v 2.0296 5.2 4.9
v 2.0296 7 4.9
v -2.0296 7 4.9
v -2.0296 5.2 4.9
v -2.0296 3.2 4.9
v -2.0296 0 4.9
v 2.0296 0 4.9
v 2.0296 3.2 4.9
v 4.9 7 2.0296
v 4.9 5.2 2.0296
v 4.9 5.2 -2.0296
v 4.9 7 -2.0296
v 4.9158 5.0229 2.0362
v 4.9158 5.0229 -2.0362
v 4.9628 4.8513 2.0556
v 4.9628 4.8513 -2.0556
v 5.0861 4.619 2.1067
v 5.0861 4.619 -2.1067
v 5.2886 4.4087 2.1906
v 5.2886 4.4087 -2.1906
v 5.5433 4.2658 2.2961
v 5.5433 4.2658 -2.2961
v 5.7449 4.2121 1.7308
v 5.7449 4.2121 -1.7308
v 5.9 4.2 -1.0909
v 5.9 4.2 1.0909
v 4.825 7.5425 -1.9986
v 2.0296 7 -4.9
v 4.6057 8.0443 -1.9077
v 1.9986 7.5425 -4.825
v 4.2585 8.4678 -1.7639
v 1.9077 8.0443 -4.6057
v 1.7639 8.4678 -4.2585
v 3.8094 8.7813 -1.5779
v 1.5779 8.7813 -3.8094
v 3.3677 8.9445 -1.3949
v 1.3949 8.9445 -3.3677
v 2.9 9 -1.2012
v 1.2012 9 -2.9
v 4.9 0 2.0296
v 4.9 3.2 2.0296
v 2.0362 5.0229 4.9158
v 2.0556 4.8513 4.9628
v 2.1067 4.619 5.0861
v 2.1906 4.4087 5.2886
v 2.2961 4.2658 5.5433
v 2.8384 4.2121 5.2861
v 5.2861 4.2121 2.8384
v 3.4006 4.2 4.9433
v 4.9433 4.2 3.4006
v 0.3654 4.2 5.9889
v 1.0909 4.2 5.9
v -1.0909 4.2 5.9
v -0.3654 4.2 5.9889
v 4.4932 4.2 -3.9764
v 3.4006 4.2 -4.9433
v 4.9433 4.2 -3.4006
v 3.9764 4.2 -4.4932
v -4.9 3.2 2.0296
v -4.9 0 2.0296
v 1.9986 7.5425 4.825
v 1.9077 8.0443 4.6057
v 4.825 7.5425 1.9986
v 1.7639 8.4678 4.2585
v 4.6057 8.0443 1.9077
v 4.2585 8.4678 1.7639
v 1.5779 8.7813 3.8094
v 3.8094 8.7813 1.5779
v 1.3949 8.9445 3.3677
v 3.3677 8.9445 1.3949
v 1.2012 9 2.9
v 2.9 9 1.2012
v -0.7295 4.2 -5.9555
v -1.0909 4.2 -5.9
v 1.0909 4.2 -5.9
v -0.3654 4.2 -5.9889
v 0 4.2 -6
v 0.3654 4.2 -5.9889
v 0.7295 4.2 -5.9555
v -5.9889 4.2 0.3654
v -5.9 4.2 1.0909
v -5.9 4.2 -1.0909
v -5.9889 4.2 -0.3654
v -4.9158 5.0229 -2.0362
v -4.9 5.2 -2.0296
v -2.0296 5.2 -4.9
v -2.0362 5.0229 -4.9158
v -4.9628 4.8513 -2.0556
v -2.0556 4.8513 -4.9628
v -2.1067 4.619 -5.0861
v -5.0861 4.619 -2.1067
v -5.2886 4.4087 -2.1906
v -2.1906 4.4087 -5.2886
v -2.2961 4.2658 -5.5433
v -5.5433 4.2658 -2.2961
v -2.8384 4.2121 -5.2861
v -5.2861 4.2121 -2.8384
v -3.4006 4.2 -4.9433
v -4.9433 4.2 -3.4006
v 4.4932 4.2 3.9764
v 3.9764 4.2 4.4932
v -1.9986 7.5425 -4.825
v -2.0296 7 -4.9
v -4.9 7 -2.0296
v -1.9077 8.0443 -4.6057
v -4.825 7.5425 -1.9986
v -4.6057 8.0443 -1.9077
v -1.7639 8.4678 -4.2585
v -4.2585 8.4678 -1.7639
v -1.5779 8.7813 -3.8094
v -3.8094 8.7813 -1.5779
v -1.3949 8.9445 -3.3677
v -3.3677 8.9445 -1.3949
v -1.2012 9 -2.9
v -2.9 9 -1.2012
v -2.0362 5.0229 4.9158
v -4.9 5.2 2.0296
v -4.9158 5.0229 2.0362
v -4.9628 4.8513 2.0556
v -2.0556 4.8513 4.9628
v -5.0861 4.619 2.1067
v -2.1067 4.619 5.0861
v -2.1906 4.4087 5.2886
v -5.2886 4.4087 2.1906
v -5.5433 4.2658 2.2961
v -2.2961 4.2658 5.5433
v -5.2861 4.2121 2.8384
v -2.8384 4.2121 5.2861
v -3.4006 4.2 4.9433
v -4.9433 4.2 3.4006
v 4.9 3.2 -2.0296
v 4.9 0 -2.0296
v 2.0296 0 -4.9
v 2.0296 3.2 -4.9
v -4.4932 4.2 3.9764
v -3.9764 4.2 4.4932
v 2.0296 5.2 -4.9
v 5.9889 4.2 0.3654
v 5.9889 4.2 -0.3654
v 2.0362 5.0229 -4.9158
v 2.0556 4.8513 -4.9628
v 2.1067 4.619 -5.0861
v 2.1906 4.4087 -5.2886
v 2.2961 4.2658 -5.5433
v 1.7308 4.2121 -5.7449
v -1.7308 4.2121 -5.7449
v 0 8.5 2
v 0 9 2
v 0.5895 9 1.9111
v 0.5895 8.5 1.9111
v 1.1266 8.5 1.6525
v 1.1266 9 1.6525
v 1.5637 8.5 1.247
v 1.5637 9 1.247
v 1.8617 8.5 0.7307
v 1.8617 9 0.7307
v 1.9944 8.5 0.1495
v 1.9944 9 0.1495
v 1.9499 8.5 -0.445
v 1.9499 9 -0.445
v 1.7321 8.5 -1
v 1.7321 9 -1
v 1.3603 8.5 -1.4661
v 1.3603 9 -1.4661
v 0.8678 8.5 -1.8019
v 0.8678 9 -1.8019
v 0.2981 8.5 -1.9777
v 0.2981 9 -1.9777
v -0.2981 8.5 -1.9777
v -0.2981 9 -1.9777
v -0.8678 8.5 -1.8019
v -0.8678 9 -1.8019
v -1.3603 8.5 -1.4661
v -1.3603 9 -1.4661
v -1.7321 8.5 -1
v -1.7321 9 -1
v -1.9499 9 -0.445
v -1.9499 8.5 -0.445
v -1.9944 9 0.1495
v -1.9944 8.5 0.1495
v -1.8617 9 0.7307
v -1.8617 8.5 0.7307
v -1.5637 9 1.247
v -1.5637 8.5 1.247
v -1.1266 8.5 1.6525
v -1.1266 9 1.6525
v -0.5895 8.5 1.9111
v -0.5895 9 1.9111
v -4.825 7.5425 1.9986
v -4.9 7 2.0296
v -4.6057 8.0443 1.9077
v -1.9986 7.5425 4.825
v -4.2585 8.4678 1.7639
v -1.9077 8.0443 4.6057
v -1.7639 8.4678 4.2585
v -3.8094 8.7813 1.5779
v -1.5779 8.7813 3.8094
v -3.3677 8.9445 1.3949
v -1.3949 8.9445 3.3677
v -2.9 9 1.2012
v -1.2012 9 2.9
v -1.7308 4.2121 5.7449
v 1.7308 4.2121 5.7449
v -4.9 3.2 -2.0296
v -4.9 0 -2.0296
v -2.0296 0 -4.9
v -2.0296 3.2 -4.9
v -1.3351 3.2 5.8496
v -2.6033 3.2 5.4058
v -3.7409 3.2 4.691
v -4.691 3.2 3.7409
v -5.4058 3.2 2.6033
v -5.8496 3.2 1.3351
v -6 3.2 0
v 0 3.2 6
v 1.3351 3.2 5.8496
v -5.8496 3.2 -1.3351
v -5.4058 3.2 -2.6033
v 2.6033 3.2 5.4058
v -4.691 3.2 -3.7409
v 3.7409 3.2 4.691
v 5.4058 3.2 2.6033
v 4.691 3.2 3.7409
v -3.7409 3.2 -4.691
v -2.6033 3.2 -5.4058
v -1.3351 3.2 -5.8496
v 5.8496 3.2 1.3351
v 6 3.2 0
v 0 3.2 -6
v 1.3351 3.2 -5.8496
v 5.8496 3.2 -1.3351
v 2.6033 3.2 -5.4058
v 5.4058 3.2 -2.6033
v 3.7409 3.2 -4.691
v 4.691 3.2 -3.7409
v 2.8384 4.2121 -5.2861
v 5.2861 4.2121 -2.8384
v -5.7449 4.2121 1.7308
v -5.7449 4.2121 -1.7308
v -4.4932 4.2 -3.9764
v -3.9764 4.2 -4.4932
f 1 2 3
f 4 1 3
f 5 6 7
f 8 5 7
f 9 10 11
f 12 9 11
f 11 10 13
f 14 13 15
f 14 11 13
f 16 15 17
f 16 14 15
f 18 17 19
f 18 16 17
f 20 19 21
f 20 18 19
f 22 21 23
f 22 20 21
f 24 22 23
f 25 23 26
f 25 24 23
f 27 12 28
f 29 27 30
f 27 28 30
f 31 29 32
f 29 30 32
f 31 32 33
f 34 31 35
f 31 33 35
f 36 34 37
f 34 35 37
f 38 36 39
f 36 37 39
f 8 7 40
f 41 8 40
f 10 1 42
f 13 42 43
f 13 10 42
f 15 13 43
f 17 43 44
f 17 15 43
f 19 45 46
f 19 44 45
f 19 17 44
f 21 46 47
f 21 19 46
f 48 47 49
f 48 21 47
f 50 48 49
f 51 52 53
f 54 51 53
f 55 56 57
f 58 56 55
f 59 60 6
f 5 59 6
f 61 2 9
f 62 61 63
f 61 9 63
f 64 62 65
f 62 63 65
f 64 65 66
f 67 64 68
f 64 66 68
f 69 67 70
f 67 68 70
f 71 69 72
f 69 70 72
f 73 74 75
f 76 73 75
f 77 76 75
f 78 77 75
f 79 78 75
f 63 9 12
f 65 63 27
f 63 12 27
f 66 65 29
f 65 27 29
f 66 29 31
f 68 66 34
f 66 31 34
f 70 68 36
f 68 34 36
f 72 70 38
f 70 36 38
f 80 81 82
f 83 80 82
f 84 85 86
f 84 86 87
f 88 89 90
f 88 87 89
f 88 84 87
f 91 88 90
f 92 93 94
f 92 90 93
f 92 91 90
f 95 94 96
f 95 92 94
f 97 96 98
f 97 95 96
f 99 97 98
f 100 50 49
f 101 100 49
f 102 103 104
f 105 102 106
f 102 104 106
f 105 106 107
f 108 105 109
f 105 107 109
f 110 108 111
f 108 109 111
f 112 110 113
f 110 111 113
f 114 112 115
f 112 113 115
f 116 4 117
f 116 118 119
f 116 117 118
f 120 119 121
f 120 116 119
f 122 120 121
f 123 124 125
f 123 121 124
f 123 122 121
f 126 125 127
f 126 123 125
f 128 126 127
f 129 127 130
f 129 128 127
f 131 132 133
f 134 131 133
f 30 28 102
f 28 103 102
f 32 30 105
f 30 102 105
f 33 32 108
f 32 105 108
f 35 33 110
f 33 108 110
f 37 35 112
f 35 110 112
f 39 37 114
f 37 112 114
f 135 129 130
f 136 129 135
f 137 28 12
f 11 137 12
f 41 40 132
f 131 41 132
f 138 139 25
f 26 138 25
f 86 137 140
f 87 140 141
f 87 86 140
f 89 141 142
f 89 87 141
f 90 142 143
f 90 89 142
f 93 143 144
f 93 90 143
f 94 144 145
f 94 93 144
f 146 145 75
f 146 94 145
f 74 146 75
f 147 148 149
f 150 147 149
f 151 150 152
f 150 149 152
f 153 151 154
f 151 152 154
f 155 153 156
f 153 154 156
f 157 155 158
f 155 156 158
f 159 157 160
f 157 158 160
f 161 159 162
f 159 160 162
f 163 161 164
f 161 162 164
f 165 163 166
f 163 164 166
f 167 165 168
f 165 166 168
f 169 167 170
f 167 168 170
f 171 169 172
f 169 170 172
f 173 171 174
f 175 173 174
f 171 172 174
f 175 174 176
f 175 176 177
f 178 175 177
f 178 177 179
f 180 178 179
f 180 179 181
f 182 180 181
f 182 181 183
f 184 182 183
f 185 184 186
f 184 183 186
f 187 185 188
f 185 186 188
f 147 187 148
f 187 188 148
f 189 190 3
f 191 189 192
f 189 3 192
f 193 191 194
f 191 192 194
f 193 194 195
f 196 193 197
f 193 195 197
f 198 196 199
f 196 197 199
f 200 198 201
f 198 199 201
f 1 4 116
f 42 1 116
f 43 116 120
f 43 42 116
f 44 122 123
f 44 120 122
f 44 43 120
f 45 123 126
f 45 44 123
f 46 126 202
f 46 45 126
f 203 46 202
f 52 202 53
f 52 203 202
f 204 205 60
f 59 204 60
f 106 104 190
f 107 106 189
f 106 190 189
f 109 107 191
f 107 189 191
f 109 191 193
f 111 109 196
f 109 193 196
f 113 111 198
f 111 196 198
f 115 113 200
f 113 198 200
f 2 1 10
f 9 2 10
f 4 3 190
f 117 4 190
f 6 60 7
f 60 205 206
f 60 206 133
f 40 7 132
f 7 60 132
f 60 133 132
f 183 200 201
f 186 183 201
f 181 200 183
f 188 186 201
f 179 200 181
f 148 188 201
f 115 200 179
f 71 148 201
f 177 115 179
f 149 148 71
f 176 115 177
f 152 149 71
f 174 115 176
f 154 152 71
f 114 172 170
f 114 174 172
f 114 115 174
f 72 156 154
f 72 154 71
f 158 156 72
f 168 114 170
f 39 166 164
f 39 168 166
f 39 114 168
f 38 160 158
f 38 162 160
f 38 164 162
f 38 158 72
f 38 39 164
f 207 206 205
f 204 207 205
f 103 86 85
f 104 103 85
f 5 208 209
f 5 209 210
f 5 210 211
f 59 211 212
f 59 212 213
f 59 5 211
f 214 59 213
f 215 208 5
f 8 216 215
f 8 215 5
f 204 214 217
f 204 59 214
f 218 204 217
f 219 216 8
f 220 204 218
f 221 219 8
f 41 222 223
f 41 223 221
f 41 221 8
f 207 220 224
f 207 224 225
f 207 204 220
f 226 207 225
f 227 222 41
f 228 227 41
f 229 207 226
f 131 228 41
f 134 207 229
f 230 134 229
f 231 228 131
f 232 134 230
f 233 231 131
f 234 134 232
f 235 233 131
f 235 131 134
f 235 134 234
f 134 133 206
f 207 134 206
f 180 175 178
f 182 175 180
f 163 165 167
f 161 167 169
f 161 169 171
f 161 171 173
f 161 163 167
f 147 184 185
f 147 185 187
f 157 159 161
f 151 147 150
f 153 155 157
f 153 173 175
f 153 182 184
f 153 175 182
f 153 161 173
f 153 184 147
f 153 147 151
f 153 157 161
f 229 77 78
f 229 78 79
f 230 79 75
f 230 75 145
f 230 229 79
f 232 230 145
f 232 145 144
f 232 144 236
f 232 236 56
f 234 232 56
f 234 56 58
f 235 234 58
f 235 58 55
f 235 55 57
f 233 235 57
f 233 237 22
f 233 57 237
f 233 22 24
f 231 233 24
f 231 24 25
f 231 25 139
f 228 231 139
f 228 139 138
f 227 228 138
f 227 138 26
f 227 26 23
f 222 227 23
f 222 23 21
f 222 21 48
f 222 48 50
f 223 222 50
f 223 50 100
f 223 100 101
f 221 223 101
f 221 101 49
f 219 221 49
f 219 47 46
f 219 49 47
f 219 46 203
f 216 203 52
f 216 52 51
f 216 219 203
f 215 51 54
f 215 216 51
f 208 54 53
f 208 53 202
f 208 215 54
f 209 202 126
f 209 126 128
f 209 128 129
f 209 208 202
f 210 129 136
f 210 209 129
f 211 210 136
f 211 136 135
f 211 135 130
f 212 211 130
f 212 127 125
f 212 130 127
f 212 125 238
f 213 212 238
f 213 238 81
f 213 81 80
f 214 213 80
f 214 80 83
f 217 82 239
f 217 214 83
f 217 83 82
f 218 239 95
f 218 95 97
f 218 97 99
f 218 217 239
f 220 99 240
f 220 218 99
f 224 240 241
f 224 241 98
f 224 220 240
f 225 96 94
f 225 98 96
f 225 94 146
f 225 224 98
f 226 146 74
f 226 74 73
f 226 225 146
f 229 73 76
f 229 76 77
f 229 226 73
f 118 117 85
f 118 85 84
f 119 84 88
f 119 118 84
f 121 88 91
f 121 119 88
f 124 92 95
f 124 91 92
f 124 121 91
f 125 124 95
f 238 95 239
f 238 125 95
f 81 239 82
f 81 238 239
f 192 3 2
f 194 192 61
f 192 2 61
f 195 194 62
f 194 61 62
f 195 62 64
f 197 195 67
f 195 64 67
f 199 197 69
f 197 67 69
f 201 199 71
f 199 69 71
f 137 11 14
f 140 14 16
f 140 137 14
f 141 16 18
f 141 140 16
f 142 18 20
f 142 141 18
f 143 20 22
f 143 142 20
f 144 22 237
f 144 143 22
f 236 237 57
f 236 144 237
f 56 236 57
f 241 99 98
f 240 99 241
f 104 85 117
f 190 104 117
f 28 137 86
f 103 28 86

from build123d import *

# Parameters (mm, degrees)
BOSS_EXTRUDE1_DEPTH = 9
SKETCH2_R           = 2
CUT_EXTRUDE1_DEPTH  = 0.5
BOSS_EXTRUDE2_START = -3.2
SKETCH3_R           = 6
BOSS_EXTRUDE2_DEPTH = 1
FILLET1_R           = 2
FILLET2_R           = 1


with BuildPart() as part:
    # Sketch1 → Boss-Extrude1 (new body)
    with BuildSketch(Plane(origin=(0, 0, 0), x_dir=(1, 0, 0), z_dir=(0, 1, 0))):
        Polygon((2.029646456, 4.9), (-2.029646456, 4.9), (-4.9, 2.029646456), (-4.9, -2.029646456), (-2.029646456, -4.9), (2.029646456, -4.9), (4.9, -2.029646456), (4.9, 2.029646456), align=None)
    extrude(amount=BOSS_EXTRUDE1_DEPTH)

    # Sketch2 → Cut-Extrude1 (cut)
    with BuildSketch(Plane(origin=(0, 9, 0), x_dir=(1, 0, 0), z_dir=(0, 1, 0))):
        with Locations(Location((0, 0, 0), (0, 0, 270))):
            Circle(SKETCH2_R)
    extrude(amount=-CUT_EXTRUDE1_DEPTH, mode=Mode.SUBTRACT)

    # Sketch3 → Boss-Extrude2 (add)
    with BuildSketch(Plane.XZ.offset(BOSS_EXTRUDE2_START)):
        with Locations(Location((0, 0, 0), (0, 0, 270))):
            Circle(SKETCH3_R)
    extrude(amount=-BOSS_EXTRUDE2_DEPTH)

    # Fillet1
    fillet1_edges = [part.edges().sort_by_distance(p)[0] for p in [
        (-3.464823228, 9, -3.464823228),
        (-4.9, 9, 0),
        (-3.464823228, 9, 3.464823228),
        (0, 9, 4.9),
        (3.464823228, 9, 3.464823228),
        (4.9, 9, 0),
        (3.464823228, 9, -3.464823228),
        (0, 9, -4.9),
    ]]
    fillet(fillet1_edges, radius=FILLET1_R)

    # Fillet2
    # the kernel refuses this fillet: 1 mm, written as the material it adds along each edge
    with BuildSketch(Plane(origin=(4.9, 4.2, -4.529646456), x_dir=(1, 0, 0), z_dir=(0, 0, 1))) as fillet2_piece_1_section:
        with BuildLine():
            CenterArc((FILLET2_R, FILLET2_R), FILLET2_R, 180, 90)
            Line((0, FILLET2_R), (0, 0))
            Line((0, 0), (FILLET2_R, 0))
        make_face()
    fillet2_piece_1 = extrude(amount=9.059292911, mode=Mode.PRIVATE)
    fillet2_piece_1 = split(fillet2_piece_1, bisect_by=Plane(origin=(6.015133886, 4.441621339, -0.91451257), z_dir=(-0.7071067811865472, 0, 0.7071067811865478)), keep=Keep.TOP, mode=Mode.PRIVATE)
    fillet2_piece_1 = split(fillet2_piece_1, bisect_by=Plane(origin=(6.015133886, 4.441621339, 0.91451257), z_dir=(-0.7071067811865478, 0, -0.7071067811865474)), keep=Keep.TOP, mode=Mode.PRIVATE)
    add(fillet2_piece_1)
    with BuildSketch(Plane(origin=(-4.529646456, 4.2, -4.9), x_dir=(0, 1, 0), z_dir=(1, 0, 0))) as fillet2_piece_2_section:
        with BuildLine():
            CenterArc((FILLET2_R, -FILLET2_R), FILLET2_R, 90, 90)
            Line((0, -FILLET2_R), (0, 0))
            Line((0, 0), (FILLET2_R, 0))
        make_face()
    fillet2_piece_2 = extrude(amount=9.059292911, mode=Mode.PRIVATE)
    fillet2_piece_2 = split(fillet2_piece_2, bisect_by=Plane(origin=(-0.91451257, 4.441621339, -6.015133886), z_dir=(0.7071067811865479, 0, 0.7071067811865472)), keep=Keep.TOP, mode=Mode.PRIVATE)
    fillet2_piece_2 = split(fillet2_piece_2, bisect_by=Plane(origin=(0.91451257, 4.441621339, -6.015133886), z_dir=(-0.7071067811865472, 0, 0.7071067811865478)), keep=Keep.TOP, mode=Mode.PRIVATE)
    add(fillet2_piece_2)
    with BuildSketch(Plane(origin=(0.261879503, 4.2, -6.667766953), x_dir=(0.7071067811865472, 0, -0.7071067811865479), z_dir=(0.7071067811865479, 0, 0.7071067811865474))) as fillet2_piece_3_section:
        with BuildLine():
            CenterArc((FILLET2_R, FILLET2_R), FILLET2_R, 180, 90)
            Line((0, FILLET2_R), (0, 0))
            Line((0, 0), (FILLET2_R, 0))
        make_face()
    fillet2_piece_3 = extrude(amount=9.059292911, mode=Mode.PRIVATE)
    fillet2_piece_3 = split(fillet2_piece_3, bisect_by=Plane(origin=(3.606683921, 4.441621339, -4.9), z_dir=(0, 0, 1)), keep=Keep.TOP, mode=Mode.PRIVATE)
    fillet2_piece_3 = split(fillet2_piece_3, bisect_by=Plane(origin=(4.9, 4.441621339, -3.606683921), z_dir=(-1, 0, 0)), keep=Keep.TOP, mode=Mode.PRIVATE)
    add(fillet2_piece_3)
    with BuildSketch(Plane(origin=(6.667766953, 4.2, 0.261879503), x_dir=(0.7071067811865478, 0, 0.7071067811865474), z_dir=(-0.7071067811865474, 0, 0.7071067811865478))) as fillet2_piece_4_section:
        with BuildLine():
            CenterArc((FILLET2_R, FILLET2_R), FILLET2_R, 180, 90)
            Line((0, FILLET2_R), (0, 0))
            Line((0, 0), (FILLET2_R, 0))
        make_face()
    fillet2_piece_4 = extrude(amount=9.059292911, mode=Mode.PRIVATE)
    fillet2_piece_4 = split(fillet2_piece_4, bisect_by=Plane(origin=(4.9, 4.441621339, 3.606683921), z_dir=(-1, 0, 0)), keep=Keep.TOP, mode=Mode.PRIVATE)
    fillet2_piece_4 = split(fillet2_piece_4, bisect_by=Plane(origin=(3.606683921, 4.441621339, 4.9), z_dir=(0, 0, -1)), keep=Keep.TOP, mode=Mode.PRIVATE)
    add(fillet2_piece_4)
    with BuildSketch(Plane(origin=(4.529646456, 4.2, 4.9), x_dir=(0, 0, 1), z_dir=(-1, 0, 0))) as fillet2_piece_5_section:
        with BuildLine():
            CenterArc((FILLET2_R, FILLET2_R), FILLET2_R, 180, 90)
            Line((0, FILLET2_R), (0, 0))
            Line((0, 0), (FILLET2_R, 0))
        make_face()
    fillet2_piece_5 = extrude(amount=9.059292911, mode=Mode.PRIVATE)
    fillet2_piece_5 = split(fillet2_piece_5, bisect_by=Plane(origin=(0.91451257, 4.441621339, 6.015133886), z_dir=(-0.7071067811865478, 0, -0.7071067811865474)), keep=Keep.TOP, mode=Mode.PRIVATE)
    fillet2_piece_5 = split(fillet2_piece_5, bisect_by=Plane(origin=(-0.91451257, 4.441621339, 6.015133886), z_dir=(0.7071067811865471, 0, -0.707106781186548)), keep=Keep.TOP, mode=Mode.PRIVATE)
    add(fillet2_piece_5)
    with BuildSketch(Plane(origin=(-0.261879503, 4.2, 6.667766953), x_dir=(-0.7071067811865471, 0, 0.707106781186548), z_dir=(-0.707106781186548, 0, -0.7071067811865471))) as fillet2_piece_6_section:
        with BuildLine():
            CenterArc((FILLET2_R, FILLET2_R), FILLET2_R, 180, 90)
            Line((0, FILLET2_R), (0, 0))
            Line((0, 0), (FILLET2_R, 0))
        make_face()
    fillet2_piece_6 = extrude(amount=9.059292911, mode=Mode.PRIVATE)
    fillet2_piece_6 = split(fillet2_piece_6, bisect_by=Plane(origin=(-4.9, 4.441621339, 3.606683921), z_dir=(1, 0, 0)), keep=Keep.TOP, mode=Mode.PRIVATE)
    fillet2_piece_6 = split(fillet2_piece_6, bisect_by=Plane(origin=(-3.606683921, 4.441621339, 4.9), z_dir=(0, 0, -1)), keep=Keep.TOP, mode=Mode.PRIVATE)
    add(fillet2_piece_6)
    with BuildSketch(Plane(origin=(-4.9, 4.2, 4.529646456), x_dir=(-1, 0, 0), z_dir=(0, 0, -1))) as fillet2_piece_7_section:
        with BuildLine():
            CenterArc((FILLET2_R, FILLET2_R), FILLET2_R, 180, 90)
            Line((0, FILLET2_R), (0, 0))
            Line((0, 0), (FILLET2_R, 0))
        make_face()
    fillet2_piece_7 = extrude(amount=9.059292911, mode=Mode.PRIVATE)
    fillet2_piece_7 = split(fillet2_piece_7, bisect_by=Plane(origin=(-6.015133886, 4.441621339, -0.91451257), z_dir=(0.7071067811865479, 0, 0.7071067811865472)), keep=Keep.TOP, mode=Mode.PRIVATE)
    fillet2_piece_7 = split(fillet2_piece_7, bisect_by=Plane(origin=(-6.015133886, 4.441621339, 0.91451257), z_dir=(0.7071067811865471, 0, -0.707106781186548)), keep=Keep.TOP, mode=Mode.PRIVATE)
    add(fillet2_piece_7)
    with BuildSketch(Plane(origin=(-6.667766953, 4.2, -0.261879503), x_dir=(0, 1, 0), z_dir=(0.7071067811865472, 0, -0.7071067811865479))) as fillet2_piece_8_section:
        with BuildLine():
            CenterArc((FILLET2_R, -FILLET2_R), FILLET2_R, 90, 90)
            Line((0, -FILLET2_R), (0, 0))
            Line((0, 0), (FILLET2_R, 0))
        make_face()
    fillet2_piece_8 = extrude(amount=9.059292911, mode=Mode.PRIVATE)
    fillet2_piece_8 = split(fillet2_piece_8, bisect_by=Plane(origin=(-3.606683921, 4.441621339, -4.9), z_dir=(0, 0, 1)), keep=Keep.TOP, mode=Mode.PRIVATE)
    fillet2_piece_8 = split(fillet2_piece_8, bisect_by=Plane(origin=(-4.9, 4.441621339, -3.606683921), z_dir=(1, 0, 0)), keep=Keep.TOP, mode=Mode.PRIVATE)
    add(fillet2_piece_8)
    with BuildSketch(Plane(origin=(0.261879503, 4.2, -6.667766953), x_dir=(0.7071067811865472, 0, -0.7071067811865479), z_dir=(0.7071067811865479, 0, 0.7071067811865474))) as fillet2_piece_9a_section:
        with BuildLine():
            CenterArc((FILLET2_R, FILLET2_R), FILLET2_R, 180, 90)
            Line((0, FILLET2_R), (0, 0))
            Line((0, 0), (FILLET2_R, 0))
        make_face()
    fillet2_piece_9a = extrude(amount=9.059292911, mode=Mode.PRIVATE)
    fillet2_piece_9a = fillet2_piece_9a & Plane(origin=(0, 4.443429881, 0), x_dir=(0, 0, -1), z_dir=(0, -1, 0)) * Cylinder(6, 23, mode=Mode.PRIVATE)
    fillet2_piece_9a = split(fillet2_piece_9a, bisect_by=Plane(origin=(4.9, 4.443429881, -1.840690438), z_dir=(1, 0, 0)), keep=Keep.TOP, mode=Mode.PRIVATE)
    with BuildSketch(Plane(origin=(4.9, 4.2, -4.529646456), x_dir=(1, 0, 0), z_dir=(0, 0, 1))) as fillet2_piece_9b_section:
        with BuildLine():
            CenterArc((FILLET2_R, FILLET2_R), FILLET2_R, 180, 90)
            Line((0, FILLET2_R), (0, 0))
            Line((0, 0), (FILLET2_R, 0))
        make_face()
    fillet2_piece_9b = extrude(amount=9.059292911, mode=Mode.PRIVATE)
    fillet2_piece_9b = fillet2_piece_9b & Plane(origin=(0, 4.443429353, 0), x_dir=(0, 0, -1), z_dir=(0, -1, 0)) * Cylinder(6, 23, mode=Mode.PRIVATE)
    fillet2_piece_9b = split(fillet2_piece_9b, bisect_by=Plane(origin=(4.766386863, 4.443429353, -2.163259593), z_dir=(0.7071067811865472, 0, -0.7071067811865478)), keep=Keep.TOP, mode=Mode.PRIVATE)
    fillet2_piece_9 = fillet2_piece_9a & fillet2_piece_9b
    add(fillet2_piece_9)
    with BuildSketch(Plane(origin=(4.9, 4.2, -4.529646456), x_dir=(1, 0, 0), z_dir=(0, 0, 1))) as fillet2_piece_10a_section:
        with BuildLine():
            CenterArc((FILLET2_R, FILLET2_R), FILLET2_R, 180, 90)
            Line((0, FILLET2_R), (0, 0))
            Line((0, 0), (FILLET2_R, 0))
        make_face()
    fillet2_piece_10a = extrude(amount=9.059292911, mode=Mode.PRIVATE)
    fillet2_piece_10a = fillet2_piece_10a & Plane(origin=(0, 4.443429527, 0), x_dir=(0, 0, -1), z_dir=(0, -1, 0)) * Cylinder(6, 23, mode=Mode.PRIVATE)
    fillet2_piece_10a = split(fillet2_piece_10a, bisect_by=Plane(origin=(4.766387172, 4.443429527, 2.163259283), z_dir=(0.7071067811865478, 0, 0.7071067811865474)), keep=Keep.TOP, mode=Mode.PRIVATE)
    with BuildSketch(Plane(origin=(6.667766953, 4.2, 0.261879503), x_dir=(0.7071067811865478, 0, 0.7071067811865474), z_dir=(-0.7071067811865474, 0, 0.7071067811865478))) as fillet2_piece_10b_section:
        with BuildLine():
            CenterArc((FILLET2_R, FILLET2_R), FILLET2_R, 180, 90)
            Line((0, FILLET2_R), (0, 0))
            Line((0, 0), (FILLET2_R, 0))
        make_face()
    fillet2_piece_10b = extrude(amount=9.059292911, mode=Mode.PRIVATE)
    fillet2_piece_10b = fillet2_piece_10b & Plane(origin=(0, 4.443429353, 0), x_dir=(0, 0, -1), z_dir=(0, -1, 0)) * Cylinder(6, 23, mode=Mode.PRIVATE)
    fillet2_piece_10b = split(fillet2_piece_10b, bisect_by=Plane(origin=(4.9, 4.443429353, 1.840688945), z_dir=(1, 0, 0)), keep=Keep.TOP, mode=Mode.PRIVATE)
    fillet2_piece_10 = fillet2_piece_10a & fillet2_piece_10b
    add(fillet2_piece_10)
    with BuildSketch(Plane(origin=(-4.529646456, 4.2, -4.9), x_dir=(0, 1, 0), z_dir=(1, 0, 0))) as fillet2_piece_11a_section:
        with BuildLine():
            CenterArc((FILLET2_R, -FILLET2_R), FILLET2_R, 90, 90)
            Line((0, -FILLET2_R), (0, 0))
            Line((0, 0), (FILLET2_R, 0))
        make_face()
    fillet2_piece_11a = extrude(amount=9.059292911, mode=Mode.PRIVATE)
    fillet2_piece_11a = split(fillet2_piece_11a, bisect_by=Plane(origin=(-2.163259583, 4.443429177, -4.766386873), z_dir=(-0.7071067811865479, 0, -0.7071067811865472)), keep=Keep.TOP, mode=Mode.PRIVATE)
    fillet2_piece_11a = fillet2_piece_11a & Plane(origin=(0, 4.443429177, 0), x_dir=(0, 0, -1), z_dir=(0, -1, 0)) * Cylinder(6, 23, mode=Mode.PRIVATE)
    with BuildSketch(Plane(origin=(-6.667766953, 4.2, -0.261879503), x_dir=(0, 1, 0), z_dir=(0.7071067811865472, 0, -0.7071067811865479))) as fillet2_piece_11b_section:
        with BuildLine():
            CenterArc((FILLET2_R, -FILLET2_R), FILLET2_R, 90, 90)
            Line((0, -FILLET2_R), (0, 0))
            Line((0, 0), (FILLET2_R, 0))
        make_face()
    fillet2_piece_11b = extrude(amount=9.059292911, mode=Mode.PRIVATE)
    fillet2_piece_11b = split(fillet2_piece_11b, bisect_by=Plane(origin=(-1.840689514, 4.443429808, -4.9), z_dir=(0, 0, -1)), keep=Keep.TOP, mode=Mode.PRIVATE)
    fillet2_piece_11b = fillet2_piece_11b & Plane(origin=(0, 4.443429808, 0), x_dir=(0, 0, -1), z_dir=(0, -1, 0)) * Cylinder(6, 23, mode=Mode.PRIVATE)
    fillet2_piece_11 = fillet2_piece_11a & fillet2_piece_11b
    add(fillet2_piece_11)
    with BuildSketch(Plane(origin=(-4.529646456, 4.2, -4.9), x_dir=(0, 1, 0), z_dir=(1, 0, 0))) as fillet2_piece_12a_section:
        with BuildLine():
            CenterArc((FILLET2_R, -FILLET2_R), FILLET2_R, 90, 90)
            Line((0, -FILLET2_R), (0, 0))
            Line((0, 0), (FILLET2_R, 0))
        make_face()
    fillet2_piece_12a = extrude(amount=9.059292911, mode=Mode.PRIVATE)
    fillet2_piece_12a = split(fillet2_piece_12a, bisect_by=Plane(origin=(2.163259191, 4.443429808, -4.766387265), z_dir=(0.7071067811865472, 0, -0.7071067811865478)), keep=Keep.TOP, mode=Mode.PRIVATE)
    fillet2_piece_12a = fillet2_piece_12a & Plane(origin=(0, 4.443429808, 0), x_dir=(0, 0, -1), z_dir=(0, -1, 0)) * Cylinder(6, 23, mode=Mode.PRIVATE)
    with BuildSketch(Plane(origin=(0.261879503, 4.2, -6.667766953), x_dir=(0.7071067811865472, 0, -0.7071067811865479), z_dir=(0.7071067811865479, 0, 0.7071067811865474))) as fillet2_piece_12b_section:
        with BuildLine():
            CenterArc((FILLET2_R, FILLET2_R), FILLET2_R, 180, 90)
            Line((0, FILLET2_R), (0, 0))
            Line((0, 0), (FILLET2_R, 0))
        make_face()
    fillet2_piece_12b = extrude(amount=9.059292911, mode=Mode.PRIVATE)
    fillet2_piece_12b = split(fillet2_piece_12b, bisect_by=Plane(origin=(1.840689039, 4.443429385, -4.9), z_dir=(0, 0, -1)), keep=Keep.TOP, mode=Mode.PRIVATE)
    fillet2_piece_12b = fillet2_piece_12b & Plane(origin=(0, 4.443429385, 0), x_dir=(0, 0, -1), z_dir=(0, -1, 0)) * Cylinder(6, 23, mode=Mode.PRIVATE)
    fillet2_piece_12 = fillet2_piece_12a & fillet2_piece_12b
    add(fillet2_piece_12)
    with BuildSketch(Plane(origin=(6.667766953, 4.2, 0.261879503), x_dir=(0.7071067811865478, 0, 0.7071067811865474), z_dir=(-0.7071067811865474, 0, 0.7071067811865478))) as fillet2_piece_13a_section:
        with BuildLine():
            CenterArc((FILLET2_R, FILLET2_R), FILLET2_R, 180, 90)
            Line((0, FILLET2_R), (0, 0))
            Line((0, 0), (FILLET2_R, 0))
        make_face()
    fillet2_piece_13a = extrude(amount=9.059292911, mode=Mode.PRIVATE)
    fillet2_piece_13a = fillet2_piece_13a & Plane(origin=(0, 4.443429527, 0), x_dir=(0, 0, -1), z_dir=(0, -1, 0)) * Cylinder(6, 23, mode=Mode.PRIVATE)
    fillet2_piece_13a = split(fillet2_piece_13a, bisect_by=Plane(origin=(1.840689383, 4.443429527, 4.9), z_dir=(0, 0, 1)), keep=Keep.TOP, mode=Mode.PRIVATE)
    with BuildSketch(Plane(origin=(4.529646456, 4.2, 4.9), x_dir=(0, 0, 1), z_dir=(-1, 0, 0))) as fillet2_piece_13b_section:
        with BuildLine():
            CenterArc((FILLET2_R, FILLET2_R), FILLET2_R, 180, 90)
            Line((0, FILLET2_R), (0, 0))
            Line((0, 0), (FILLET2_R, 0))
        make_face()
    fillet2_piece_13b = extrude(amount=9.059292911, mode=Mode.PRIVATE)
    fillet2_piece_13b = fillet2_piece_13b & Plane(origin=(0, 4.443429353, 0), x_dir=(0, 0, -1), z_dir=(0, -1, 0)) * Cylinder(6, 23, mode=Mode.PRIVATE)
    fillet2_piece_13b = split(fillet2_piece_13b, bisect_by=Plane(origin=(2.163259593, 4.443429353, 4.766386863), z_dir=(0.7071067811865478, 0, 0.7071067811865474)), keep=Keep.TOP, mode=Mode.PRIVATE)
    fillet2_piece_13 = fillet2_piece_13a & fillet2_piece_13b
    add(fillet2_piece_13)
    with BuildSketch(Plane(origin=(4.529646456, 4.2, 4.9), x_dir=(0, 0, 1), z_dir=(-1, 0, 0))) as fillet2_piece_14a_section:
        with BuildLine():
            CenterArc((FILLET2_R, FILLET2_R), FILLET2_R, 180, 90)
            Line((0, FILLET2_R), (0, 0))
            Line((0, 0), (FILLET2_R, 0))
        make_face()
    fillet2_piece_14a = extrude(amount=9.059292911, mode=Mode.PRIVATE)
    fillet2_piece_14a = fillet2_piece_14a & Plane(origin=(0, 4.443429527, 0), x_dir=(0, 0, -1), z_dir=(0, -1, 0)) * Cylinder(6, 23, mode=Mode.PRIVATE)
    fillet2_piece_14a = split(fillet2_piece_14a, bisect_by=Plane(origin=(-2.163259283, 4.443429527, 4.766387172), z_dir=(-0.7071067811865471, 0, 0.707106781186548)), keep=Keep.TOP, mode=Mode.PRIVATE)
    with BuildSketch(Plane(origin=(-0.261879503, 4.2, 6.667766953), x_dir=(-0.7071067811865471, 0, 0.707106781186548), z_dir=(-0.707106781186548, 0, -0.7071067811865471))) as fillet2_piece_14b_section:
        with BuildLine():
            CenterArc((FILLET2_R, FILLET2_R), FILLET2_R, 180, 90)
            Line((0, FILLET2_R), (0, 0))
            Line((0, 0), (FILLET2_R, 0))
        make_face()
    fillet2_piece_14b = extrude(amount=9.059292911, mode=Mode.PRIVATE)
    fillet2_piece_14b = fillet2_piece_14b & Plane(origin=(0, 4.443429353, 0), x_dir=(0, 0, -1), z_dir=(0, -1, 0)) * Cylinder(6, 23, mode=Mode.PRIVATE)
    fillet2_piece_14b = split(fillet2_piece_14b, bisect_by=Plane(origin=(-1.840688945, 4.443429353, 4.9), z_dir=(0, 0, 1)), keep=Keep.TOP, mode=Mode.PRIVATE)
    fillet2_piece_14 = fillet2_piece_14a & fillet2_piece_14b
    add(fillet2_piece_14)
    with BuildSketch(Plane(origin=(-0.261879503, 4.2, 6.667766953), x_dir=(-0.7071067811865471, 0, 0.707106781186548), z_dir=(-0.707106781186548, 0, -0.7071067811865471))) as fillet2_piece_15a_section:
        with BuildLine():
            CenterArc((FILLET2_R, FILLET2_R), FILLET2_R, 180, 90)
            Line((0, FILLET2_R), (0, 0))
            Line((0, 0), (FILLET2_R, 0))
        make_face()
    fillet2_piece_15a = extrude(amount=9.059292911, mode=Mode.PRIVATE)
    fillet2_piece_15a = fillet2_piece_15a & Plane(origin=(0, 4.443429527, 0), x_dir=(0, 0, -1), z_dir=(0, -1, 0)) * Cylinder(6, 23, mode=Mode.PRIVATE)
    fillet2_piece_15a = split(fillet2_piece_15a, bisect_by=Plane(origin=(-4.9, 4.443429527, 1.840689383), z_dir=(-1, 0, 0)), keep=Keep.TOP, mode=Mode.PRIVATE)
    with BuildSketch(Plane(origin=(-4.9, 4.2, 4.529646456), x_dir=(-1, 0, 0), z_dir=(0, 0, -1))) as fillet2_piece_15b_section:
        with BuildLine():
            CenterArc((FILLET2_R, FILLET2_R), FILLET2_R, 180, 90)
            Line((0, FILLET2_R), (0, 0))
            Line((0, 0), (FILLET2_R, 0))
        make_face()
    fillet2_piece_15b = extrude(amount=9.059292911, mode=Mode.PRIVATE)
    fillet2_piece_15b = fillet2_piece_15b & Plane(origin=(0, 4.443429385, 0), x_dir=(0, 0, -1), z_dir=(0, -1, 0)) * Cylinder(6, 23, mode=Mode.PRIVATE)
    fillet2_piece_15b = split(fillet2_piece_15b, bisect_by=Plane(origin=(-4.766386929, 4.443429385, 2.163259526), z_dir=(-0.7071067811865471, 0, 0.707106781186548)), keep=Keep.TOP, mode=Mode.PRIVATE)
    fillet2_piece_15 = fillet2_piece_15a & fillet2_piece_15b
    add(fillet2_piece_15)
    with BuildSketch(Plane(origin=(-6.667766953, 4.2, -0.261879503), x_dir=(0, 1, 0), z_dir=(0.7071067811865472, 0, -0.7071067811865479))) as fillet2_piece_16a_section:
        with BuildLine():
            CenterArc((FILLET2_R, -FILLET2_R), FILLET2_R, 90, 90)
            Line((0, -FILLET2_R), (0, 0))
            Line((0, 0), (FILLET2_R, 0))
        make_face()
    fillet2_piece_16a = extrude(amount=9.059292911, mode=Mode.PRIVATE)
    fillet2_piece_16a = split(fillet2_piece_16a, bisect_by=Plane(origin=(-4.9, 4.443429177, -1.840688959), z_dir=(-1, 0, 0)), keep=Keep.TOP, mode=Mode.PRIVATE)
    fillet2_piece_16a = fillet2_piece_16a & Plane(origin=(0, 4.443429177, 0), x_dir=(0, 0, -1), z_dir=(0, -1, 0)) * Cylinder(6, 23, mode=Mode.PRIVATE)
    with BuildSketch(Plane(origin=(-4.9, 4.2, 4.529646456), x_dir=(-1, 0, 0), z_dir=(0, 0, -1))) as fillet2_piece_16b_section:
        with BuildLine():
            CenterArc((FILLET2_R, FILLET2_R), FILLET2_R, 180, 90)
            Line((0, FILLET2_R), (0, 0))
            Line((0, 0), (FILLET2_R, 0))
        make_face()
    fillet2_piece_16b = extrude(amount=9.059292911, mode=Mode.PRIVATE)
    fillet2_piece_16b = split(fillet2_piece_16b, bisect_by=Plane(origin=(-4.766387919, 4.443429881, -2.163258537), z_dir=(-0.7071067811865479, 0, -0.7071067811865472)), keep=Keep.TOP, mode=Mode.PRIVATE)
    fillet2_piece_16b = fillet2_piece_16b & Plane(origin=(0, 4.443429881, 0), x_dir=(0, 0, -1), z_dir=(0, -1, 0)) * Cylinder(6, 23, mode=Mode.PRIVATE)
    fillet2_piece_16 = fillet2_piece_16a & fillet2_piece_16b
    add(fillet2_piece_16)


solid = part.part
